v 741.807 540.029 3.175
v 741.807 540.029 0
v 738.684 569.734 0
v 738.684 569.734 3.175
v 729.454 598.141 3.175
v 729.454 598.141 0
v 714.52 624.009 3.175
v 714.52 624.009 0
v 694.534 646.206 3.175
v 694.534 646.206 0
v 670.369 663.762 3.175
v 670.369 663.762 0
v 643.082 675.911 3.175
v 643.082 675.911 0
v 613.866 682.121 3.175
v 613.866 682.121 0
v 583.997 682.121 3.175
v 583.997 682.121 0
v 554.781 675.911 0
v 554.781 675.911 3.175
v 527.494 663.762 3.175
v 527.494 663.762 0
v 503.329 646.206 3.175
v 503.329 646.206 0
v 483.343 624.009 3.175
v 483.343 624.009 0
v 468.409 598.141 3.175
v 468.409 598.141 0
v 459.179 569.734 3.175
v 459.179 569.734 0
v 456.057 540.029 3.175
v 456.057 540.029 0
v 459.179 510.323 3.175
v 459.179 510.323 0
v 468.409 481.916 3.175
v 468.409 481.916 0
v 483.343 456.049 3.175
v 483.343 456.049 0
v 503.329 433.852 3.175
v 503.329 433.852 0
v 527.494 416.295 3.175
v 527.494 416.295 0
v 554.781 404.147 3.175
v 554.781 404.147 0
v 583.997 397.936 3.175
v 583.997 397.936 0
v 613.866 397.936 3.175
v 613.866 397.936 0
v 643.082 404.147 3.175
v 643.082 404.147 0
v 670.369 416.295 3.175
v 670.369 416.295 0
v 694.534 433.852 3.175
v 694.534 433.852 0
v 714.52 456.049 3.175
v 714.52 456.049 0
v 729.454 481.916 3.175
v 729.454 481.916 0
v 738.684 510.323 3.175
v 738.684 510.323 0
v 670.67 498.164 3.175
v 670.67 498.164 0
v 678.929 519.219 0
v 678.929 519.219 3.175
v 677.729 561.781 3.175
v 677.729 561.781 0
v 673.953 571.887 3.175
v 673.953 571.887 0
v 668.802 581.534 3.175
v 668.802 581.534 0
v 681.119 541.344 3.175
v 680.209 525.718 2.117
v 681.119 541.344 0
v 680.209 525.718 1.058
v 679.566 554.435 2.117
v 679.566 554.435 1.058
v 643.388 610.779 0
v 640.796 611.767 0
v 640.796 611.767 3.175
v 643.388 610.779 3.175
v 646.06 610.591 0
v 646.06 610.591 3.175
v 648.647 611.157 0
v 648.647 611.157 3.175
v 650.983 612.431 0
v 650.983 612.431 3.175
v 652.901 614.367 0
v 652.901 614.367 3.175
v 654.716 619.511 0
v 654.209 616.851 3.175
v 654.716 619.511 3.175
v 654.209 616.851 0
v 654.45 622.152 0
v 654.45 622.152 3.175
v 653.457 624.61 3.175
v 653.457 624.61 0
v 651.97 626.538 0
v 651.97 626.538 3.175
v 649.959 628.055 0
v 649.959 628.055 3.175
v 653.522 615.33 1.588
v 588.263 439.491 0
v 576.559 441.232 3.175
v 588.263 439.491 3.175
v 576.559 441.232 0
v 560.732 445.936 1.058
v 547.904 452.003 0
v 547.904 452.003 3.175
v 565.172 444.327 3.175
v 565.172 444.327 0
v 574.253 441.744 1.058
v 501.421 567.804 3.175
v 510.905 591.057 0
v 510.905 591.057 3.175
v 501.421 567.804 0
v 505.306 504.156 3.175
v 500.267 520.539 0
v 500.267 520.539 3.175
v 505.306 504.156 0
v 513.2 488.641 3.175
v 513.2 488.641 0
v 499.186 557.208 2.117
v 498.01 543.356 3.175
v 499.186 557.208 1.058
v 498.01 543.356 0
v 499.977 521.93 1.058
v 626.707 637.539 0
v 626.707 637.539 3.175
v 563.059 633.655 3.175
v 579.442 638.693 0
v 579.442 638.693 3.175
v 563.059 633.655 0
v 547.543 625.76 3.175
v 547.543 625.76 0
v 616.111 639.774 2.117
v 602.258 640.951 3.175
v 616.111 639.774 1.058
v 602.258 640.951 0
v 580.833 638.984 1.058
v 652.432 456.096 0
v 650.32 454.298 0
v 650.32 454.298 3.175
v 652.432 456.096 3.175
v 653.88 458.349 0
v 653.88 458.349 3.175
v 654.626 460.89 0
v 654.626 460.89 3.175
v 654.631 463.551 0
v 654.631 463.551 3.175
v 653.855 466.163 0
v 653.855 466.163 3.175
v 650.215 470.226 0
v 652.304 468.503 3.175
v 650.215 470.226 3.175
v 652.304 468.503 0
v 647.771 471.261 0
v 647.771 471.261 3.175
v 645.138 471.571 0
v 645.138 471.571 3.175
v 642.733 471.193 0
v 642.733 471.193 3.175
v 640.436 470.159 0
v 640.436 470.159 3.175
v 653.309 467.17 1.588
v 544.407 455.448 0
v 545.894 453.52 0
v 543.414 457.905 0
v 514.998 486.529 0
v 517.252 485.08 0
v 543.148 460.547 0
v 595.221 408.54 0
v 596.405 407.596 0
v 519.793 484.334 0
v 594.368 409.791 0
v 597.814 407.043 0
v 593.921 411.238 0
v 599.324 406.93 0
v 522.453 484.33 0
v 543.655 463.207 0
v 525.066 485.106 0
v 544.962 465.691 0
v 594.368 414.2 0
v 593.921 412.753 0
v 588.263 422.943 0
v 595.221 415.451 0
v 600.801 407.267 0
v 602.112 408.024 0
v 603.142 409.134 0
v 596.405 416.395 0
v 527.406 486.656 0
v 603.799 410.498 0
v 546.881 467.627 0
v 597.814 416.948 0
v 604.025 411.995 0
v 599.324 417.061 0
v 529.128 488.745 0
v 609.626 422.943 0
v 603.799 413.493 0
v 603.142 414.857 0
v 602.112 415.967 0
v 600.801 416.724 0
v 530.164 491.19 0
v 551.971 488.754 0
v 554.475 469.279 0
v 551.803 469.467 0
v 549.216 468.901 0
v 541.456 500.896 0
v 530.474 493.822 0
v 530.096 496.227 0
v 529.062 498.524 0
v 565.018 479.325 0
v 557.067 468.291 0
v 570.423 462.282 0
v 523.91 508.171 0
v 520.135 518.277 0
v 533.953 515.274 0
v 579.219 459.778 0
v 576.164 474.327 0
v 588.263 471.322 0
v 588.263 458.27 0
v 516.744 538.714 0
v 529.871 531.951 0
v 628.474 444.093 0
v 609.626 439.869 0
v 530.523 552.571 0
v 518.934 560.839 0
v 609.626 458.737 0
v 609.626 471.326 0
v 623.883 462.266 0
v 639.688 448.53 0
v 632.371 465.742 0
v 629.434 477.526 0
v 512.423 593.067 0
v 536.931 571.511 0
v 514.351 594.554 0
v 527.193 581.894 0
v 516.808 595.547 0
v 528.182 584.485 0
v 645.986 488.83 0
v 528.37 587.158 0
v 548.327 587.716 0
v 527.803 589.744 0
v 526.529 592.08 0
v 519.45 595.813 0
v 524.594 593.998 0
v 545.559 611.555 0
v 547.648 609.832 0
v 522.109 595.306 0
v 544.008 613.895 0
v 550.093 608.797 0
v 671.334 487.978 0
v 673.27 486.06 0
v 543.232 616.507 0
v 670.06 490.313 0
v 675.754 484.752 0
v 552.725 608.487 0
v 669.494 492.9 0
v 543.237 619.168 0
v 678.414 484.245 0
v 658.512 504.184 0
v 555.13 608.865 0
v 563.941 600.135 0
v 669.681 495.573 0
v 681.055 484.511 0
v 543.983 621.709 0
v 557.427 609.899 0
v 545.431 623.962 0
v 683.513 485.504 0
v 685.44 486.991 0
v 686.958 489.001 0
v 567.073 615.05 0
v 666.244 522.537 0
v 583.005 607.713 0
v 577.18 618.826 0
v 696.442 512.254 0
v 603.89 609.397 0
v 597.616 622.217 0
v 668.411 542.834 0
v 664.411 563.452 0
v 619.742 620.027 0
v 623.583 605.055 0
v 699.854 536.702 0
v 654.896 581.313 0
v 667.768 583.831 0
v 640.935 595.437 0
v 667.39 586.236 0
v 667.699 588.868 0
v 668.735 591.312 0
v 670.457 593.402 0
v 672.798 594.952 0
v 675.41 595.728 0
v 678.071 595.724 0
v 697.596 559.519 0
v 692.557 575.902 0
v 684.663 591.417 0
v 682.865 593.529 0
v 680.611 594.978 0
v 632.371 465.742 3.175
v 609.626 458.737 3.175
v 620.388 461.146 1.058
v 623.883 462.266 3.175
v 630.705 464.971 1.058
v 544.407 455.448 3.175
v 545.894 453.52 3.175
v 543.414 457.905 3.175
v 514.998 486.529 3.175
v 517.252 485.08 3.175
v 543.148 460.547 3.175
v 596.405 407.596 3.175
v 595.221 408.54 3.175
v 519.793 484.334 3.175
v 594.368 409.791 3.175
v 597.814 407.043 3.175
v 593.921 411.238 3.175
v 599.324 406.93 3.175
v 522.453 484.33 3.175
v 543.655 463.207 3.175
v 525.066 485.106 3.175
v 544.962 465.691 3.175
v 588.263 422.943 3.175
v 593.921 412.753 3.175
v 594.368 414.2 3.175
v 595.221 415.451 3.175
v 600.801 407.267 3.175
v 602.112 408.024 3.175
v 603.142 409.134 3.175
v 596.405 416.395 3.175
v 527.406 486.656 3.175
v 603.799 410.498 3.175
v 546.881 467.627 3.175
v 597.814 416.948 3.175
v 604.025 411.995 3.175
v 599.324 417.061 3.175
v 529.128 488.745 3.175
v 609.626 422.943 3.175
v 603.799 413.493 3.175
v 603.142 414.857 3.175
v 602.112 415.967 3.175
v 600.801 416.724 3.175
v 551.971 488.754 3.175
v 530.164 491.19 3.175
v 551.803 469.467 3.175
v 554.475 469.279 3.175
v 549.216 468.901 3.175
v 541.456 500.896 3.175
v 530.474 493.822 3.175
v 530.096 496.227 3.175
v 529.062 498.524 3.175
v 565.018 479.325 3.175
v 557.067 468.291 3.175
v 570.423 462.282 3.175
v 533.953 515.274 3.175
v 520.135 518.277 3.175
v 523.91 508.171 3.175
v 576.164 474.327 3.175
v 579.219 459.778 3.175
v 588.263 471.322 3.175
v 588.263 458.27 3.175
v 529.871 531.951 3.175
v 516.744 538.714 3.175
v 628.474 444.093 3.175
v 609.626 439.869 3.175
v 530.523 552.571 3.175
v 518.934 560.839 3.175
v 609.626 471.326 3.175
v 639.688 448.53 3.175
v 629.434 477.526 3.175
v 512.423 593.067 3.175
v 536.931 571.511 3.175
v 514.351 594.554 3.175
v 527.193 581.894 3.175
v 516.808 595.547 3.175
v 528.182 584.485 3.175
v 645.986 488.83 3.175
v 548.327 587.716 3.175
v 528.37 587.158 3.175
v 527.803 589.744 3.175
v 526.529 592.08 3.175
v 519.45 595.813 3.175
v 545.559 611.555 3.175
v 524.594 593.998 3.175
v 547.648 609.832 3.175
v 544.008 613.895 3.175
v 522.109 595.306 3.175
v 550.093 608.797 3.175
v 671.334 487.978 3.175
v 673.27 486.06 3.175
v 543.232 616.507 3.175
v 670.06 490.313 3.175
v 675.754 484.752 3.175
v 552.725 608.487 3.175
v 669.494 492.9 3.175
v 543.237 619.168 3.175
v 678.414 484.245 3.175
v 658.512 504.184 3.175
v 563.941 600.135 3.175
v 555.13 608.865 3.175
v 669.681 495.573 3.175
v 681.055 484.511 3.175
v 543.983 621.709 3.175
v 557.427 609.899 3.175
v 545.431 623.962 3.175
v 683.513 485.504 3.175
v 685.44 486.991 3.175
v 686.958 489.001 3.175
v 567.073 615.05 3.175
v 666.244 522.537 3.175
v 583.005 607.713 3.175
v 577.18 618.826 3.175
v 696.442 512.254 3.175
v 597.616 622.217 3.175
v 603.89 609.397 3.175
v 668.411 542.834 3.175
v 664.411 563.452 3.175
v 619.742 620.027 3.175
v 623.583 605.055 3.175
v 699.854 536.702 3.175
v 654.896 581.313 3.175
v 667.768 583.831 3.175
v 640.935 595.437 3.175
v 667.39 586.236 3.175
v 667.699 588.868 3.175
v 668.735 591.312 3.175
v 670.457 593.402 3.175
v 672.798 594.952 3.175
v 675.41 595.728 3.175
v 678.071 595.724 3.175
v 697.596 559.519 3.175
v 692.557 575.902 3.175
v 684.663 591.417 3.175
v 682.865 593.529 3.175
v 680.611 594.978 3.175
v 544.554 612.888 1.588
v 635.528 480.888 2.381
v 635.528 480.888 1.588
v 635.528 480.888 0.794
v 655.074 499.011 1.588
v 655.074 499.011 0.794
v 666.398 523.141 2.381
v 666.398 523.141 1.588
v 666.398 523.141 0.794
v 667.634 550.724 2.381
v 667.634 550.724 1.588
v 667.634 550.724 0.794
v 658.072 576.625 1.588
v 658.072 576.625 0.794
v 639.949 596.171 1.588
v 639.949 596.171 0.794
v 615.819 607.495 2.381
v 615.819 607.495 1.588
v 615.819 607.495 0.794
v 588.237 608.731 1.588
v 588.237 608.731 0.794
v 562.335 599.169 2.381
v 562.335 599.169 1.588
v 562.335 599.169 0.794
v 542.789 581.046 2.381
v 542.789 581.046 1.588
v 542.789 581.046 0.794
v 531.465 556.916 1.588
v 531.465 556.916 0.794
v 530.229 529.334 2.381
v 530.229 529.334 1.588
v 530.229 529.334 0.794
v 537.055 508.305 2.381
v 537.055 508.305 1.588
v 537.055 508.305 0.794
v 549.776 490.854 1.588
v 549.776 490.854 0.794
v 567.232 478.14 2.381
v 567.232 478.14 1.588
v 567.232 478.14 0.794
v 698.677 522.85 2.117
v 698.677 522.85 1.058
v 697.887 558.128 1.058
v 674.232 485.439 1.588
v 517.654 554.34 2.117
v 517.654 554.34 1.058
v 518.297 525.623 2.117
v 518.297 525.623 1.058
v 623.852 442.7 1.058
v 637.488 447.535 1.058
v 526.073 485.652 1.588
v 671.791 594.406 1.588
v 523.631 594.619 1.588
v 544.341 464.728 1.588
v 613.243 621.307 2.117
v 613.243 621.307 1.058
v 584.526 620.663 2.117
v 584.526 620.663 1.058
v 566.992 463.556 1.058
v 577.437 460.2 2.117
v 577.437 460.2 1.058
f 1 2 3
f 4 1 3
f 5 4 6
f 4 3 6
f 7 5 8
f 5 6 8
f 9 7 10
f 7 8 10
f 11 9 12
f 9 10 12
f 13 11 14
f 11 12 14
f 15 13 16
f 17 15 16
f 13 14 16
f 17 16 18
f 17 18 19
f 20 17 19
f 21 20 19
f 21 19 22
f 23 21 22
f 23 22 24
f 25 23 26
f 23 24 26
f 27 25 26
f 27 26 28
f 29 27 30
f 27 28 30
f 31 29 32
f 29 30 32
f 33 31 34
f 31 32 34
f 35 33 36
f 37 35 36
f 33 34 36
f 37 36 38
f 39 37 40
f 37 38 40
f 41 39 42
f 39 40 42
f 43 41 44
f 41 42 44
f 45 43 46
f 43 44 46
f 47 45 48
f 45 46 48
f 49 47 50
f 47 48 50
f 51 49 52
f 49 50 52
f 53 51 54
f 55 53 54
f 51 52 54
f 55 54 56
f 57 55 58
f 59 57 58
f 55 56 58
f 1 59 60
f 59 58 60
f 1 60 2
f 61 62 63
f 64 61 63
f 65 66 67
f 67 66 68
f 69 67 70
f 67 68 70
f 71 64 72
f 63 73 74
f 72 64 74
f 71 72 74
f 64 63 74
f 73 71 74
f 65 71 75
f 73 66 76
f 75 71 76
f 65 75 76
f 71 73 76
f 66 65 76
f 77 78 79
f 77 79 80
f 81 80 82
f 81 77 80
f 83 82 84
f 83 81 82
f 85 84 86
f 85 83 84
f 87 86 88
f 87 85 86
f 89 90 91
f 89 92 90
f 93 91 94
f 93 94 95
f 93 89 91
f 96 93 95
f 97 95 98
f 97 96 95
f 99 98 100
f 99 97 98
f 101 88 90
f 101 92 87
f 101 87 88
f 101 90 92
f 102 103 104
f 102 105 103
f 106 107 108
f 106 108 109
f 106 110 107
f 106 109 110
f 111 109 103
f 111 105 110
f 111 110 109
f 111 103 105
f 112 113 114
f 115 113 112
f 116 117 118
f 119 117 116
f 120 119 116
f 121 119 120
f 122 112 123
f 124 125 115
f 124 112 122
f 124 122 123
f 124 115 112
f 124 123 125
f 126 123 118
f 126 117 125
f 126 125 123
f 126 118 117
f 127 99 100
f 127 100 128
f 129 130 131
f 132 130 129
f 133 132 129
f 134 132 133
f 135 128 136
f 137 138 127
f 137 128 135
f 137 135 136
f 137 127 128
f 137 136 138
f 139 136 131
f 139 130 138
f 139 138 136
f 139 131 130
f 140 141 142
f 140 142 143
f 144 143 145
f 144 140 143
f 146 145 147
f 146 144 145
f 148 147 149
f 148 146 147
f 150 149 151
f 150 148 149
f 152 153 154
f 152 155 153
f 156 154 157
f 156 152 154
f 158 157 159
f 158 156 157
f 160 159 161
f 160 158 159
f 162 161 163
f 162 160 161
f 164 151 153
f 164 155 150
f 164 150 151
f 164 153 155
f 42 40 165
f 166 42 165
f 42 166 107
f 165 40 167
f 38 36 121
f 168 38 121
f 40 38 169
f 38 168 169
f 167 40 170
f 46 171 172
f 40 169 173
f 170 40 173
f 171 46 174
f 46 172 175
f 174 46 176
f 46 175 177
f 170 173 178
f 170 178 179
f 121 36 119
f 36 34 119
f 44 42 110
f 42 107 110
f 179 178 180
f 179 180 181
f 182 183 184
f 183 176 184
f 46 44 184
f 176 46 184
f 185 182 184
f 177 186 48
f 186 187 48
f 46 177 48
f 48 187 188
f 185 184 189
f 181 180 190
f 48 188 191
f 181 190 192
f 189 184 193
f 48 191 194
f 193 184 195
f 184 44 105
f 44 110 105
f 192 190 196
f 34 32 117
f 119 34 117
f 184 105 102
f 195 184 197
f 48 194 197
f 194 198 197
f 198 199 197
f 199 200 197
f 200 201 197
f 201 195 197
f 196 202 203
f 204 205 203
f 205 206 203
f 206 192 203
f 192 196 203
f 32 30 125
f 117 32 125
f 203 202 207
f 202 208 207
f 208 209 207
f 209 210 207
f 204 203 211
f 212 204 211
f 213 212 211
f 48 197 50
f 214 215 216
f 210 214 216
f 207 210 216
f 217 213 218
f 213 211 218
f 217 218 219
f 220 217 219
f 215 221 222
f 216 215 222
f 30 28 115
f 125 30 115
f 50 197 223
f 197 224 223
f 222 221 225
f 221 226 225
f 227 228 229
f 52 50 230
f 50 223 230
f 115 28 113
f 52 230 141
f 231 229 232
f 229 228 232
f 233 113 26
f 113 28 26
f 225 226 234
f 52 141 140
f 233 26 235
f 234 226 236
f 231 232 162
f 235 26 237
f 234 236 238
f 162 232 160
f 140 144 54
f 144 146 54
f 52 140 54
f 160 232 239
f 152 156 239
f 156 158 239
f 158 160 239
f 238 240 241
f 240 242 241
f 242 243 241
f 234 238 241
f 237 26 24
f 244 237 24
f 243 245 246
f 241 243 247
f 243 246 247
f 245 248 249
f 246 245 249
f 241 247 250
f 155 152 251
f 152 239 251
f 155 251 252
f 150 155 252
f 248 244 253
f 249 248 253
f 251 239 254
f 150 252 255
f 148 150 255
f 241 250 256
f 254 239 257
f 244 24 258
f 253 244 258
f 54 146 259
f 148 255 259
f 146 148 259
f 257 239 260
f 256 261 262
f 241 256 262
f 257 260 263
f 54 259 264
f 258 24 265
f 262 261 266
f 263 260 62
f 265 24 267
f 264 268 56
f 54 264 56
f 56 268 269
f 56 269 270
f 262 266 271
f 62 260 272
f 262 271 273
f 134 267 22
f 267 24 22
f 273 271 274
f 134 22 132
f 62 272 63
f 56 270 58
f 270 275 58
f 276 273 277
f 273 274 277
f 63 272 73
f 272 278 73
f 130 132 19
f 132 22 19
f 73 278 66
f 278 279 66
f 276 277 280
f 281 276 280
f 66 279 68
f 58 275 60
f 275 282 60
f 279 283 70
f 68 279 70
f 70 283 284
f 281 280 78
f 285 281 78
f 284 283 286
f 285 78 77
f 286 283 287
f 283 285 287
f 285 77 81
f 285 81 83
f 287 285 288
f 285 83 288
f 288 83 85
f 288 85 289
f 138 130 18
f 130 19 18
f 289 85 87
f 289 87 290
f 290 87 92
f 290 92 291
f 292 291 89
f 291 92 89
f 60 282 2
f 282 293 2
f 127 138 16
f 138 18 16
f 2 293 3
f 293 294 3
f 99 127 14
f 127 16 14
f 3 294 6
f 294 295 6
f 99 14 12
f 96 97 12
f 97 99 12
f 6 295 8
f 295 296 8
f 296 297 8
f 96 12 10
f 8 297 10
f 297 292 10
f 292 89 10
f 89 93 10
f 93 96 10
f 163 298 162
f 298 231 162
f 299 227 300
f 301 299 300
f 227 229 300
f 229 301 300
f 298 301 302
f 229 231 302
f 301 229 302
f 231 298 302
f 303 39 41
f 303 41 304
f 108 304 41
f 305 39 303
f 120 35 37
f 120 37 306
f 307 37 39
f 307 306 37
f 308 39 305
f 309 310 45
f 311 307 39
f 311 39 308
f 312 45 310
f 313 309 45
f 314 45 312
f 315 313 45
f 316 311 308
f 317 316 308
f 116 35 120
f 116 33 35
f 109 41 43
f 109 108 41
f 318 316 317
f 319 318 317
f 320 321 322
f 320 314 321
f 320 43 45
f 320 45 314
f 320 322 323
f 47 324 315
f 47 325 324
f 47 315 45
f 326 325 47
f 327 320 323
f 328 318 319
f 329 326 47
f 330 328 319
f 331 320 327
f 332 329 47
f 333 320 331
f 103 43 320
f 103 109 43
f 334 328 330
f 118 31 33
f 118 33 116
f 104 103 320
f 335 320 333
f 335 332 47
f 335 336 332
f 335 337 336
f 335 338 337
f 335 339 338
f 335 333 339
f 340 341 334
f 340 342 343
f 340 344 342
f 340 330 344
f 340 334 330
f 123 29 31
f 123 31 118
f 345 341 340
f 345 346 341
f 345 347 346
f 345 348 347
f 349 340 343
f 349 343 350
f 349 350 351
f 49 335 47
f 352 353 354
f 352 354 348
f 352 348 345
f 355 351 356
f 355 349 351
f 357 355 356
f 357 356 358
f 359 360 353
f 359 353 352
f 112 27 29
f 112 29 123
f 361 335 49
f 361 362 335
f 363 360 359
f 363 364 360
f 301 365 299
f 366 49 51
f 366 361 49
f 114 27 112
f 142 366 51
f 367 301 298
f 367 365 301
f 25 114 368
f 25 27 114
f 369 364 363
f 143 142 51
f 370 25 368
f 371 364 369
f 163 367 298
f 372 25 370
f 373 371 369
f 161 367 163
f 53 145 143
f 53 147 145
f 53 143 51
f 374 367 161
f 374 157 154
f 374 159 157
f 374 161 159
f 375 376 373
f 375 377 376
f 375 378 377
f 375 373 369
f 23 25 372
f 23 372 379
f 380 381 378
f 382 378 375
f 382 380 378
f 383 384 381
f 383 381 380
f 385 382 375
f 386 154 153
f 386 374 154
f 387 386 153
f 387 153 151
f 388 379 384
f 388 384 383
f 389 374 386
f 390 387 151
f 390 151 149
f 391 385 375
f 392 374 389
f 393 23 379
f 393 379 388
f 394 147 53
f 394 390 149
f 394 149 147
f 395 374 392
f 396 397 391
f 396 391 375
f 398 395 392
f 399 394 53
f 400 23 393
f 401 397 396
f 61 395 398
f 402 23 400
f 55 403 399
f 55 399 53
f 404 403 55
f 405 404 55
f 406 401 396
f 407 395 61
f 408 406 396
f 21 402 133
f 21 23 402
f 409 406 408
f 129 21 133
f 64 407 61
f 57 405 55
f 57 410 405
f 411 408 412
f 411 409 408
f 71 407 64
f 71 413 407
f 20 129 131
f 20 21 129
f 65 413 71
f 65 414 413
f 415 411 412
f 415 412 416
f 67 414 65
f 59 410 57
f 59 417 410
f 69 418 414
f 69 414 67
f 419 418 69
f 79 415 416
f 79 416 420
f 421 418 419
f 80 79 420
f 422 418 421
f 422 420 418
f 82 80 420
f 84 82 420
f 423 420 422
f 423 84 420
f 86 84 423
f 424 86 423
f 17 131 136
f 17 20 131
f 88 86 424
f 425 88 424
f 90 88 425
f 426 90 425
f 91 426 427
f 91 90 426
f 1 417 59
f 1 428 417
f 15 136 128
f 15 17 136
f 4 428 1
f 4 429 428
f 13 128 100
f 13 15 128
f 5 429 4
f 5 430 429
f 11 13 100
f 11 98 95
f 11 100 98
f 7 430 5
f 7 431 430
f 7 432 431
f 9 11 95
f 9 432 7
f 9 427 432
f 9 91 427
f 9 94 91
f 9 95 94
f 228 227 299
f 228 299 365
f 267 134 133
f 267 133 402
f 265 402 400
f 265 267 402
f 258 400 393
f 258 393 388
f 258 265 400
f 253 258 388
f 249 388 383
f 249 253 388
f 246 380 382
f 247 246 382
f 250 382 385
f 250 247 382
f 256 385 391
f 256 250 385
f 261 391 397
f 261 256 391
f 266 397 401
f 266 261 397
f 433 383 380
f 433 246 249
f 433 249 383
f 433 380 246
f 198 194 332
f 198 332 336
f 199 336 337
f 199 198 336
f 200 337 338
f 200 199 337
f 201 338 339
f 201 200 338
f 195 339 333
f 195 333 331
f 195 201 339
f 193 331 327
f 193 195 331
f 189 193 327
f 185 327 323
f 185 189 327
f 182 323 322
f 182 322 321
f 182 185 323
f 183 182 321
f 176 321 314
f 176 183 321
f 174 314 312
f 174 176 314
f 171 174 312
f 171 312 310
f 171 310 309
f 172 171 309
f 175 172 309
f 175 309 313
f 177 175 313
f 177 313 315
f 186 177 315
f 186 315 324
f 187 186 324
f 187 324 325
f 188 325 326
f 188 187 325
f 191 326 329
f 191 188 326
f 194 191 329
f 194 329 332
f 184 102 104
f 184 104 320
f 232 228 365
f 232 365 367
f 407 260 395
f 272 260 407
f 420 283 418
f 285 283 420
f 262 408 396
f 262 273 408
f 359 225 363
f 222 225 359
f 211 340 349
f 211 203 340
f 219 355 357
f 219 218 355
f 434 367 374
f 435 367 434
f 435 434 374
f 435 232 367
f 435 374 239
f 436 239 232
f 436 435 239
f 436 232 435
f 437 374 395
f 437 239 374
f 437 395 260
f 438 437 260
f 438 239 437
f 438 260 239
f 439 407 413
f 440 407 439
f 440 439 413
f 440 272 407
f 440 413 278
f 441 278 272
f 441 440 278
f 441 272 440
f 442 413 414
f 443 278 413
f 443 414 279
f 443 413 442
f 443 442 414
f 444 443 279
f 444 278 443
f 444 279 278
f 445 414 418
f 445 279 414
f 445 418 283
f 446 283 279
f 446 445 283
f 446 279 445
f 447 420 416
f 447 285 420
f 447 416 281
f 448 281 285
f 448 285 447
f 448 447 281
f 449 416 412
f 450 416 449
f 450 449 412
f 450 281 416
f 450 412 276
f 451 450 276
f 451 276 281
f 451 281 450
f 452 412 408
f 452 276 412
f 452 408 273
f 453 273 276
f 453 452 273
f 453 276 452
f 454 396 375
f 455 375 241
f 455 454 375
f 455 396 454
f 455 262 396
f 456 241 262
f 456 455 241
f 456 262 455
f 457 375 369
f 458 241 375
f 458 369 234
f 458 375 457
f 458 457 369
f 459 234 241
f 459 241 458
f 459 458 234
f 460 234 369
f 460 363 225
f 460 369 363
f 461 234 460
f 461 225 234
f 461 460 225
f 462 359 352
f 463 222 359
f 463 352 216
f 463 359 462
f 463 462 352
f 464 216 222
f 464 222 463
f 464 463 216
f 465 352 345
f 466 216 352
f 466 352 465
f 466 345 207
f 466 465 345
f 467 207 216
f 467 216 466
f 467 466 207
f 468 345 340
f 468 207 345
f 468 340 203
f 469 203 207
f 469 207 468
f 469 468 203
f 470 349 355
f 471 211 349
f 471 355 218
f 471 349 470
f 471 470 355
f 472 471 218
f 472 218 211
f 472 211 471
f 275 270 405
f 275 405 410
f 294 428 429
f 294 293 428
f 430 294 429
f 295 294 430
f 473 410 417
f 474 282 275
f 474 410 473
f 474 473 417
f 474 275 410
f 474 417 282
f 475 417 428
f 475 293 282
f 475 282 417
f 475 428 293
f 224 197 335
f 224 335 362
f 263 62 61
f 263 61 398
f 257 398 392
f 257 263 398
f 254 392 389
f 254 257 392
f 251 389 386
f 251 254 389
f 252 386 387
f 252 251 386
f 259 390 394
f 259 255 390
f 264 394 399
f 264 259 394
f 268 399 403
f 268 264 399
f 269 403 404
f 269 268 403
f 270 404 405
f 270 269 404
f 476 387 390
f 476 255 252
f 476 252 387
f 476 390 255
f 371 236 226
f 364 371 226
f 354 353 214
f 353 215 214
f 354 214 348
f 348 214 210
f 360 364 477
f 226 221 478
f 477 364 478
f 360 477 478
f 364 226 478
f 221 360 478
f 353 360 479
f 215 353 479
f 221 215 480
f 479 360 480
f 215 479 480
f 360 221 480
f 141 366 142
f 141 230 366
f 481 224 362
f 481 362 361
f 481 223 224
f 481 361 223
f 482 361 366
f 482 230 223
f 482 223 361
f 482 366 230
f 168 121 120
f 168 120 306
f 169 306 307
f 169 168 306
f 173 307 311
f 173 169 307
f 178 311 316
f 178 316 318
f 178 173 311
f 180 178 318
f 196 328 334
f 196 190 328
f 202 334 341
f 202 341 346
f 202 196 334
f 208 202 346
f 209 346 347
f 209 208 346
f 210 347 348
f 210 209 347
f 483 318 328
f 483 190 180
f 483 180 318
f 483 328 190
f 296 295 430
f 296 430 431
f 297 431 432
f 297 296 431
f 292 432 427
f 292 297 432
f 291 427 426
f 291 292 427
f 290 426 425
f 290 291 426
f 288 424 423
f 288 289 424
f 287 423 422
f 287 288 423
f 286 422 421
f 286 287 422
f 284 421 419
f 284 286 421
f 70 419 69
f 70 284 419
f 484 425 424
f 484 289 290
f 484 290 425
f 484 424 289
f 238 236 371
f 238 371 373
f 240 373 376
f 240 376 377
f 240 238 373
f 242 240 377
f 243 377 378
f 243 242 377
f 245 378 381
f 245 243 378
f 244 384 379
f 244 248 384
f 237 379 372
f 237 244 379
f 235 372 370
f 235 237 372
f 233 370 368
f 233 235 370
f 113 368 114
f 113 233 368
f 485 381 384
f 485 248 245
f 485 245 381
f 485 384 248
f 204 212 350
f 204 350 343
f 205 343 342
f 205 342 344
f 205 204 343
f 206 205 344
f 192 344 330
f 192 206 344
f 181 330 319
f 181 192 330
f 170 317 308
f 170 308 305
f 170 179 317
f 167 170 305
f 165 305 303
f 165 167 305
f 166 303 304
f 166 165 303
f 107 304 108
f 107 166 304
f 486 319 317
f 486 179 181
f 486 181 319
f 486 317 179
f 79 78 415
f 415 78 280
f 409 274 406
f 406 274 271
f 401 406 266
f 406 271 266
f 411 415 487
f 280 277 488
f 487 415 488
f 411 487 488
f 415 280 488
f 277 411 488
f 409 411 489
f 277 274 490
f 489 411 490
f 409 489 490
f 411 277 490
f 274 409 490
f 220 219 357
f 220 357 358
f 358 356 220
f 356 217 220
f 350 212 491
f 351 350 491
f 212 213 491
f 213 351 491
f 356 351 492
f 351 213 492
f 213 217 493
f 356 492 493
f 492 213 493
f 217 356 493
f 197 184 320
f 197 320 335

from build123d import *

# Parameters (mm, degrees)
MODEL_R             = 142.875
MODEL_R_2           = 5.08
BOSS_EXTRUDE1_DEPTH = 3.175


with BuildPart() as part:
    # Model → Boss-Extrude1 (new body)
    with BuildSketch(Plane.XY):
        with Locations((598.931529384, 540.028739073)):
            Circle(MODEL_R)
        with Locations((598.94473685, 411.99537176)):
            Circle(MODEL_R_2, mode=Mode.SUBTRACT)
        with BuildLine():
            Line((588.263058769, 439.49067885), (588.263058769, 432.46777176))
            Line((588.263058769, 432.46777176), (588.263058769, 422.94277176))
            Line((588.263058769, 422.94277176), (609.626414932, 422.94277176))
            Line((609.626414932, 422.94277176), (609.626414932, 432.46777176))
            Line((609.626414932, 432.46777176), (609.626414932, 439.869117325))
            add(Edge.make_bspline(
                [(609.626414932, 439.869117325), (624.076093151, 441.673413325), (637.961028614, 446.596503111), (650.319934945, 454.297549728)],
                knots=[0, 0, 0, 0, 1, 1, 1, 1], degree=3))
            add(Edge.make_bspline(
                [(650.319934945, 454.297549728), (654.699959233, 457.026818025), (656.038161369, 462.790038372), (650.579624776, 471.550086948), (644.816404429, 472.888289084), (640.436380141, 470.159020788)],
                knots=[0, 0, 0, 0, 1, 1, 2, 2, 2, 2], degree=3))
            add(Edge.make_bspline(
                [(609.626414932, 458.736713526), (620.563261609, 460.421069084), (631.044671662, 464.306886071), (640.436380141, 470.159020788)],
                knots=[0, 0, 0, 0, 1, 1, 1, 1], degree=3))
            Line((609.626414932, 458.736713526), (609.626414932, 471.326189462))
            add(Edge.make_bspline(
                [(609.626414932, 471.326189462), (647.569785357, 477.23281165), (673.540701185, 512.780254195), (661.727456807, 588.666995045), (626.180014262, 614.637910874), (550.293273412, 602.824666496), (524.322357584, 567.277223951), (530.228979773, 529.333853526), (534.884697336, 499.426131239), (558.353548704, 475.966301231), (588.263058769, 471.322082665)],
                knots=[0, 0, 0, 0, 1, 1, 2, 2, 3, 3, 3, 4, 4, 4, 4], degree=3))
            Line((588.263058769, 471.322082665), (588.263058769, 458.270419272))
            add(Edge.make_bspline(
                [(557.066987985, 468.290799115), (566.68347822, 462.880962168), (577.295001116, 459.472472333), (588.263058769, 458.270419272)],
                knots=[0, 0, 0, 0, 1, 1, 1, 1], degree=3))
            add(Edge.make_bspline(
                [(557.066987985, 468.290799115), (552.569101696, 470.821122636), (546.871611923, 469.226097865), (541.81096488, 460.230325286), (543.405989652, 454.532835513), (547.903875941, 452.002511992)],
                knots=[0, 0, 0, 0, 1, 1, 2, 2, 2, 2], degree=3))
            add(Edge.make_bspline(
                [(547.903875941, 452.002511992), (560.318178706, 445.018742224), (574.075306668, 440.753866736), (588.263058769, 439.49067885)],
                knots=[0, 0, 0, 0, 1, 1, 1, 1], degree=3))
        make_face(mode=Mode.SUBTRACT)
        with BuildLine():
            add(Edge.make_bspline(
                [(670.669823945, 498.164296946), (668.139500424, 493.666410656), (669.734525196, 487.968920884), (678.730297775, 482.908273841), (684.427787547, 484.503298612), (686.958111069, 489.001184902)],
                knots=[0, 0, 0, 0, 1, 1, 2, 2, 2, 2], degree=3))
            add(Edge.make_bspline(
                [(686.958111069, 489.001184902), (704.957293449, 520.996411982), (704.077427826, 560.260415411), (684.663073332, 591.417243905)],
                knots=[0, 0, 0, 0, 1, 1, 1, 1], degree=3))
            add(Edge.make_bspline(
                [(684.663073332, 591.417243905), (681.933805036, 595.797268193), (676.170584688, 597.135470329), (667.410536112, 591.676933737), (666.072333976, 585.913713389), (668.801602272, 581.533689101)],
                knots=[0, 0, 0, 0, 1, 1, 2, 2, 2, 2], degree=3))
            add(Edge.make_bspline(
                [(670.669823945, 498.164296946), (685.321636453, 524.209261568), (684.605402467, 556.171203195), (668.801602272, 581.533689101)],
                knots=[0, 0, 0, 0, 1, 1, 1, 1], degree=3))
        make_face(mode=Mode.SUBTRACT)
        with BuildLine():
            add(Edge.make_bspline(
                [(640.796326115, 611.767132906), (645.294212404, 609.236809385), (650.991702177, 610.831834156), (656.05234922, 619.827606735), (654.457324448, 625.525096508), (649.959438158, 628.055420029)],
                knots=[0, 0, 0, 0, 1, 1, 2, 2, 2, 2], degree=3))
            add(Edge.make_bspline(
                [(649.959438158, 628.055420029), (617.964211079, 646.05460241), (578.700207649, 645.174736787), (547.543379155, 625.760382293)],
                knots=[0, 0, 0, 0, 1, 1, 1, 1], degree=3))
            add(Edge.make_bspline(
                [(547.543379155, 625.760382293), (543.163354867, 623.031113996), (541.825152731, 617.267893649), (547.283689324, 608.507845073), (553.046909671, 607.169642937), (557.426933959, 609.898911233)],
                knots=[0, 0, 0, 0, 1, 1, 2, 2, 2, 2], degree=3))
            add(Edge.make_bspline(
                [(640.796326115, 611.767132906), (614.751361492, 626.418945414), (582.789419865, 625.702711428), (557.426933959, 609.898911233)],
                knots=[0, 0, 0, 0, 1, 1, 1, 1], degree=3))
        make_face(mode=Mode.SUBTRACT)
        with BuildLine():
            add(Edge.make_bspline(
                [(527.193490155, 581.893635075), (529.723813676, 586.391521365), (528.128788904, 592.089011137), (519.133016325, 597.14965818), (513.435526552, 595.554633409), (510.905203031, 591.056747119)],
                knots=[0, 0, 0, 0, 1, 1, 2, 2, 2, 2], degree=3))
            add(Edge.make_bspline(
                [(510.905203031, 591.056747119), (492.906020651, 559.061520039), (493.785886274, 519.79751661), (513.200240768, 488.640688116)],
                knots=[0, 0, 0, 0, 1, 1, 1, 1], degree=3))
            add(Edge.make_bspline(
                [(513.200240768, 488.640688116), (515.929509064, 484.260663827), (521.692729412, 482.922461692), (530.452777988, 488.380998284), (531.790980124, 494.144218632), (529.061711827, 498.52424292)],
                knots=[0, 0, 0, 0, 1, 1, 2, 2, 2, 2], degree=3))
            add(Edge.make_bspline(
                [(527.193490155, 581.893635075), (512.541677646, 555.848670453), (513.257911632, 523.886728826), (529.061711827, 498.52424292)],
                knots=[0, 0, 0, 0, 1, 1, 1, 1], degree=3))
        make_face(mode=Mode.SUBTRACT)
    extrude(amount=BOSS_EXTRUDE1_DEPTH)


solid = part.part
